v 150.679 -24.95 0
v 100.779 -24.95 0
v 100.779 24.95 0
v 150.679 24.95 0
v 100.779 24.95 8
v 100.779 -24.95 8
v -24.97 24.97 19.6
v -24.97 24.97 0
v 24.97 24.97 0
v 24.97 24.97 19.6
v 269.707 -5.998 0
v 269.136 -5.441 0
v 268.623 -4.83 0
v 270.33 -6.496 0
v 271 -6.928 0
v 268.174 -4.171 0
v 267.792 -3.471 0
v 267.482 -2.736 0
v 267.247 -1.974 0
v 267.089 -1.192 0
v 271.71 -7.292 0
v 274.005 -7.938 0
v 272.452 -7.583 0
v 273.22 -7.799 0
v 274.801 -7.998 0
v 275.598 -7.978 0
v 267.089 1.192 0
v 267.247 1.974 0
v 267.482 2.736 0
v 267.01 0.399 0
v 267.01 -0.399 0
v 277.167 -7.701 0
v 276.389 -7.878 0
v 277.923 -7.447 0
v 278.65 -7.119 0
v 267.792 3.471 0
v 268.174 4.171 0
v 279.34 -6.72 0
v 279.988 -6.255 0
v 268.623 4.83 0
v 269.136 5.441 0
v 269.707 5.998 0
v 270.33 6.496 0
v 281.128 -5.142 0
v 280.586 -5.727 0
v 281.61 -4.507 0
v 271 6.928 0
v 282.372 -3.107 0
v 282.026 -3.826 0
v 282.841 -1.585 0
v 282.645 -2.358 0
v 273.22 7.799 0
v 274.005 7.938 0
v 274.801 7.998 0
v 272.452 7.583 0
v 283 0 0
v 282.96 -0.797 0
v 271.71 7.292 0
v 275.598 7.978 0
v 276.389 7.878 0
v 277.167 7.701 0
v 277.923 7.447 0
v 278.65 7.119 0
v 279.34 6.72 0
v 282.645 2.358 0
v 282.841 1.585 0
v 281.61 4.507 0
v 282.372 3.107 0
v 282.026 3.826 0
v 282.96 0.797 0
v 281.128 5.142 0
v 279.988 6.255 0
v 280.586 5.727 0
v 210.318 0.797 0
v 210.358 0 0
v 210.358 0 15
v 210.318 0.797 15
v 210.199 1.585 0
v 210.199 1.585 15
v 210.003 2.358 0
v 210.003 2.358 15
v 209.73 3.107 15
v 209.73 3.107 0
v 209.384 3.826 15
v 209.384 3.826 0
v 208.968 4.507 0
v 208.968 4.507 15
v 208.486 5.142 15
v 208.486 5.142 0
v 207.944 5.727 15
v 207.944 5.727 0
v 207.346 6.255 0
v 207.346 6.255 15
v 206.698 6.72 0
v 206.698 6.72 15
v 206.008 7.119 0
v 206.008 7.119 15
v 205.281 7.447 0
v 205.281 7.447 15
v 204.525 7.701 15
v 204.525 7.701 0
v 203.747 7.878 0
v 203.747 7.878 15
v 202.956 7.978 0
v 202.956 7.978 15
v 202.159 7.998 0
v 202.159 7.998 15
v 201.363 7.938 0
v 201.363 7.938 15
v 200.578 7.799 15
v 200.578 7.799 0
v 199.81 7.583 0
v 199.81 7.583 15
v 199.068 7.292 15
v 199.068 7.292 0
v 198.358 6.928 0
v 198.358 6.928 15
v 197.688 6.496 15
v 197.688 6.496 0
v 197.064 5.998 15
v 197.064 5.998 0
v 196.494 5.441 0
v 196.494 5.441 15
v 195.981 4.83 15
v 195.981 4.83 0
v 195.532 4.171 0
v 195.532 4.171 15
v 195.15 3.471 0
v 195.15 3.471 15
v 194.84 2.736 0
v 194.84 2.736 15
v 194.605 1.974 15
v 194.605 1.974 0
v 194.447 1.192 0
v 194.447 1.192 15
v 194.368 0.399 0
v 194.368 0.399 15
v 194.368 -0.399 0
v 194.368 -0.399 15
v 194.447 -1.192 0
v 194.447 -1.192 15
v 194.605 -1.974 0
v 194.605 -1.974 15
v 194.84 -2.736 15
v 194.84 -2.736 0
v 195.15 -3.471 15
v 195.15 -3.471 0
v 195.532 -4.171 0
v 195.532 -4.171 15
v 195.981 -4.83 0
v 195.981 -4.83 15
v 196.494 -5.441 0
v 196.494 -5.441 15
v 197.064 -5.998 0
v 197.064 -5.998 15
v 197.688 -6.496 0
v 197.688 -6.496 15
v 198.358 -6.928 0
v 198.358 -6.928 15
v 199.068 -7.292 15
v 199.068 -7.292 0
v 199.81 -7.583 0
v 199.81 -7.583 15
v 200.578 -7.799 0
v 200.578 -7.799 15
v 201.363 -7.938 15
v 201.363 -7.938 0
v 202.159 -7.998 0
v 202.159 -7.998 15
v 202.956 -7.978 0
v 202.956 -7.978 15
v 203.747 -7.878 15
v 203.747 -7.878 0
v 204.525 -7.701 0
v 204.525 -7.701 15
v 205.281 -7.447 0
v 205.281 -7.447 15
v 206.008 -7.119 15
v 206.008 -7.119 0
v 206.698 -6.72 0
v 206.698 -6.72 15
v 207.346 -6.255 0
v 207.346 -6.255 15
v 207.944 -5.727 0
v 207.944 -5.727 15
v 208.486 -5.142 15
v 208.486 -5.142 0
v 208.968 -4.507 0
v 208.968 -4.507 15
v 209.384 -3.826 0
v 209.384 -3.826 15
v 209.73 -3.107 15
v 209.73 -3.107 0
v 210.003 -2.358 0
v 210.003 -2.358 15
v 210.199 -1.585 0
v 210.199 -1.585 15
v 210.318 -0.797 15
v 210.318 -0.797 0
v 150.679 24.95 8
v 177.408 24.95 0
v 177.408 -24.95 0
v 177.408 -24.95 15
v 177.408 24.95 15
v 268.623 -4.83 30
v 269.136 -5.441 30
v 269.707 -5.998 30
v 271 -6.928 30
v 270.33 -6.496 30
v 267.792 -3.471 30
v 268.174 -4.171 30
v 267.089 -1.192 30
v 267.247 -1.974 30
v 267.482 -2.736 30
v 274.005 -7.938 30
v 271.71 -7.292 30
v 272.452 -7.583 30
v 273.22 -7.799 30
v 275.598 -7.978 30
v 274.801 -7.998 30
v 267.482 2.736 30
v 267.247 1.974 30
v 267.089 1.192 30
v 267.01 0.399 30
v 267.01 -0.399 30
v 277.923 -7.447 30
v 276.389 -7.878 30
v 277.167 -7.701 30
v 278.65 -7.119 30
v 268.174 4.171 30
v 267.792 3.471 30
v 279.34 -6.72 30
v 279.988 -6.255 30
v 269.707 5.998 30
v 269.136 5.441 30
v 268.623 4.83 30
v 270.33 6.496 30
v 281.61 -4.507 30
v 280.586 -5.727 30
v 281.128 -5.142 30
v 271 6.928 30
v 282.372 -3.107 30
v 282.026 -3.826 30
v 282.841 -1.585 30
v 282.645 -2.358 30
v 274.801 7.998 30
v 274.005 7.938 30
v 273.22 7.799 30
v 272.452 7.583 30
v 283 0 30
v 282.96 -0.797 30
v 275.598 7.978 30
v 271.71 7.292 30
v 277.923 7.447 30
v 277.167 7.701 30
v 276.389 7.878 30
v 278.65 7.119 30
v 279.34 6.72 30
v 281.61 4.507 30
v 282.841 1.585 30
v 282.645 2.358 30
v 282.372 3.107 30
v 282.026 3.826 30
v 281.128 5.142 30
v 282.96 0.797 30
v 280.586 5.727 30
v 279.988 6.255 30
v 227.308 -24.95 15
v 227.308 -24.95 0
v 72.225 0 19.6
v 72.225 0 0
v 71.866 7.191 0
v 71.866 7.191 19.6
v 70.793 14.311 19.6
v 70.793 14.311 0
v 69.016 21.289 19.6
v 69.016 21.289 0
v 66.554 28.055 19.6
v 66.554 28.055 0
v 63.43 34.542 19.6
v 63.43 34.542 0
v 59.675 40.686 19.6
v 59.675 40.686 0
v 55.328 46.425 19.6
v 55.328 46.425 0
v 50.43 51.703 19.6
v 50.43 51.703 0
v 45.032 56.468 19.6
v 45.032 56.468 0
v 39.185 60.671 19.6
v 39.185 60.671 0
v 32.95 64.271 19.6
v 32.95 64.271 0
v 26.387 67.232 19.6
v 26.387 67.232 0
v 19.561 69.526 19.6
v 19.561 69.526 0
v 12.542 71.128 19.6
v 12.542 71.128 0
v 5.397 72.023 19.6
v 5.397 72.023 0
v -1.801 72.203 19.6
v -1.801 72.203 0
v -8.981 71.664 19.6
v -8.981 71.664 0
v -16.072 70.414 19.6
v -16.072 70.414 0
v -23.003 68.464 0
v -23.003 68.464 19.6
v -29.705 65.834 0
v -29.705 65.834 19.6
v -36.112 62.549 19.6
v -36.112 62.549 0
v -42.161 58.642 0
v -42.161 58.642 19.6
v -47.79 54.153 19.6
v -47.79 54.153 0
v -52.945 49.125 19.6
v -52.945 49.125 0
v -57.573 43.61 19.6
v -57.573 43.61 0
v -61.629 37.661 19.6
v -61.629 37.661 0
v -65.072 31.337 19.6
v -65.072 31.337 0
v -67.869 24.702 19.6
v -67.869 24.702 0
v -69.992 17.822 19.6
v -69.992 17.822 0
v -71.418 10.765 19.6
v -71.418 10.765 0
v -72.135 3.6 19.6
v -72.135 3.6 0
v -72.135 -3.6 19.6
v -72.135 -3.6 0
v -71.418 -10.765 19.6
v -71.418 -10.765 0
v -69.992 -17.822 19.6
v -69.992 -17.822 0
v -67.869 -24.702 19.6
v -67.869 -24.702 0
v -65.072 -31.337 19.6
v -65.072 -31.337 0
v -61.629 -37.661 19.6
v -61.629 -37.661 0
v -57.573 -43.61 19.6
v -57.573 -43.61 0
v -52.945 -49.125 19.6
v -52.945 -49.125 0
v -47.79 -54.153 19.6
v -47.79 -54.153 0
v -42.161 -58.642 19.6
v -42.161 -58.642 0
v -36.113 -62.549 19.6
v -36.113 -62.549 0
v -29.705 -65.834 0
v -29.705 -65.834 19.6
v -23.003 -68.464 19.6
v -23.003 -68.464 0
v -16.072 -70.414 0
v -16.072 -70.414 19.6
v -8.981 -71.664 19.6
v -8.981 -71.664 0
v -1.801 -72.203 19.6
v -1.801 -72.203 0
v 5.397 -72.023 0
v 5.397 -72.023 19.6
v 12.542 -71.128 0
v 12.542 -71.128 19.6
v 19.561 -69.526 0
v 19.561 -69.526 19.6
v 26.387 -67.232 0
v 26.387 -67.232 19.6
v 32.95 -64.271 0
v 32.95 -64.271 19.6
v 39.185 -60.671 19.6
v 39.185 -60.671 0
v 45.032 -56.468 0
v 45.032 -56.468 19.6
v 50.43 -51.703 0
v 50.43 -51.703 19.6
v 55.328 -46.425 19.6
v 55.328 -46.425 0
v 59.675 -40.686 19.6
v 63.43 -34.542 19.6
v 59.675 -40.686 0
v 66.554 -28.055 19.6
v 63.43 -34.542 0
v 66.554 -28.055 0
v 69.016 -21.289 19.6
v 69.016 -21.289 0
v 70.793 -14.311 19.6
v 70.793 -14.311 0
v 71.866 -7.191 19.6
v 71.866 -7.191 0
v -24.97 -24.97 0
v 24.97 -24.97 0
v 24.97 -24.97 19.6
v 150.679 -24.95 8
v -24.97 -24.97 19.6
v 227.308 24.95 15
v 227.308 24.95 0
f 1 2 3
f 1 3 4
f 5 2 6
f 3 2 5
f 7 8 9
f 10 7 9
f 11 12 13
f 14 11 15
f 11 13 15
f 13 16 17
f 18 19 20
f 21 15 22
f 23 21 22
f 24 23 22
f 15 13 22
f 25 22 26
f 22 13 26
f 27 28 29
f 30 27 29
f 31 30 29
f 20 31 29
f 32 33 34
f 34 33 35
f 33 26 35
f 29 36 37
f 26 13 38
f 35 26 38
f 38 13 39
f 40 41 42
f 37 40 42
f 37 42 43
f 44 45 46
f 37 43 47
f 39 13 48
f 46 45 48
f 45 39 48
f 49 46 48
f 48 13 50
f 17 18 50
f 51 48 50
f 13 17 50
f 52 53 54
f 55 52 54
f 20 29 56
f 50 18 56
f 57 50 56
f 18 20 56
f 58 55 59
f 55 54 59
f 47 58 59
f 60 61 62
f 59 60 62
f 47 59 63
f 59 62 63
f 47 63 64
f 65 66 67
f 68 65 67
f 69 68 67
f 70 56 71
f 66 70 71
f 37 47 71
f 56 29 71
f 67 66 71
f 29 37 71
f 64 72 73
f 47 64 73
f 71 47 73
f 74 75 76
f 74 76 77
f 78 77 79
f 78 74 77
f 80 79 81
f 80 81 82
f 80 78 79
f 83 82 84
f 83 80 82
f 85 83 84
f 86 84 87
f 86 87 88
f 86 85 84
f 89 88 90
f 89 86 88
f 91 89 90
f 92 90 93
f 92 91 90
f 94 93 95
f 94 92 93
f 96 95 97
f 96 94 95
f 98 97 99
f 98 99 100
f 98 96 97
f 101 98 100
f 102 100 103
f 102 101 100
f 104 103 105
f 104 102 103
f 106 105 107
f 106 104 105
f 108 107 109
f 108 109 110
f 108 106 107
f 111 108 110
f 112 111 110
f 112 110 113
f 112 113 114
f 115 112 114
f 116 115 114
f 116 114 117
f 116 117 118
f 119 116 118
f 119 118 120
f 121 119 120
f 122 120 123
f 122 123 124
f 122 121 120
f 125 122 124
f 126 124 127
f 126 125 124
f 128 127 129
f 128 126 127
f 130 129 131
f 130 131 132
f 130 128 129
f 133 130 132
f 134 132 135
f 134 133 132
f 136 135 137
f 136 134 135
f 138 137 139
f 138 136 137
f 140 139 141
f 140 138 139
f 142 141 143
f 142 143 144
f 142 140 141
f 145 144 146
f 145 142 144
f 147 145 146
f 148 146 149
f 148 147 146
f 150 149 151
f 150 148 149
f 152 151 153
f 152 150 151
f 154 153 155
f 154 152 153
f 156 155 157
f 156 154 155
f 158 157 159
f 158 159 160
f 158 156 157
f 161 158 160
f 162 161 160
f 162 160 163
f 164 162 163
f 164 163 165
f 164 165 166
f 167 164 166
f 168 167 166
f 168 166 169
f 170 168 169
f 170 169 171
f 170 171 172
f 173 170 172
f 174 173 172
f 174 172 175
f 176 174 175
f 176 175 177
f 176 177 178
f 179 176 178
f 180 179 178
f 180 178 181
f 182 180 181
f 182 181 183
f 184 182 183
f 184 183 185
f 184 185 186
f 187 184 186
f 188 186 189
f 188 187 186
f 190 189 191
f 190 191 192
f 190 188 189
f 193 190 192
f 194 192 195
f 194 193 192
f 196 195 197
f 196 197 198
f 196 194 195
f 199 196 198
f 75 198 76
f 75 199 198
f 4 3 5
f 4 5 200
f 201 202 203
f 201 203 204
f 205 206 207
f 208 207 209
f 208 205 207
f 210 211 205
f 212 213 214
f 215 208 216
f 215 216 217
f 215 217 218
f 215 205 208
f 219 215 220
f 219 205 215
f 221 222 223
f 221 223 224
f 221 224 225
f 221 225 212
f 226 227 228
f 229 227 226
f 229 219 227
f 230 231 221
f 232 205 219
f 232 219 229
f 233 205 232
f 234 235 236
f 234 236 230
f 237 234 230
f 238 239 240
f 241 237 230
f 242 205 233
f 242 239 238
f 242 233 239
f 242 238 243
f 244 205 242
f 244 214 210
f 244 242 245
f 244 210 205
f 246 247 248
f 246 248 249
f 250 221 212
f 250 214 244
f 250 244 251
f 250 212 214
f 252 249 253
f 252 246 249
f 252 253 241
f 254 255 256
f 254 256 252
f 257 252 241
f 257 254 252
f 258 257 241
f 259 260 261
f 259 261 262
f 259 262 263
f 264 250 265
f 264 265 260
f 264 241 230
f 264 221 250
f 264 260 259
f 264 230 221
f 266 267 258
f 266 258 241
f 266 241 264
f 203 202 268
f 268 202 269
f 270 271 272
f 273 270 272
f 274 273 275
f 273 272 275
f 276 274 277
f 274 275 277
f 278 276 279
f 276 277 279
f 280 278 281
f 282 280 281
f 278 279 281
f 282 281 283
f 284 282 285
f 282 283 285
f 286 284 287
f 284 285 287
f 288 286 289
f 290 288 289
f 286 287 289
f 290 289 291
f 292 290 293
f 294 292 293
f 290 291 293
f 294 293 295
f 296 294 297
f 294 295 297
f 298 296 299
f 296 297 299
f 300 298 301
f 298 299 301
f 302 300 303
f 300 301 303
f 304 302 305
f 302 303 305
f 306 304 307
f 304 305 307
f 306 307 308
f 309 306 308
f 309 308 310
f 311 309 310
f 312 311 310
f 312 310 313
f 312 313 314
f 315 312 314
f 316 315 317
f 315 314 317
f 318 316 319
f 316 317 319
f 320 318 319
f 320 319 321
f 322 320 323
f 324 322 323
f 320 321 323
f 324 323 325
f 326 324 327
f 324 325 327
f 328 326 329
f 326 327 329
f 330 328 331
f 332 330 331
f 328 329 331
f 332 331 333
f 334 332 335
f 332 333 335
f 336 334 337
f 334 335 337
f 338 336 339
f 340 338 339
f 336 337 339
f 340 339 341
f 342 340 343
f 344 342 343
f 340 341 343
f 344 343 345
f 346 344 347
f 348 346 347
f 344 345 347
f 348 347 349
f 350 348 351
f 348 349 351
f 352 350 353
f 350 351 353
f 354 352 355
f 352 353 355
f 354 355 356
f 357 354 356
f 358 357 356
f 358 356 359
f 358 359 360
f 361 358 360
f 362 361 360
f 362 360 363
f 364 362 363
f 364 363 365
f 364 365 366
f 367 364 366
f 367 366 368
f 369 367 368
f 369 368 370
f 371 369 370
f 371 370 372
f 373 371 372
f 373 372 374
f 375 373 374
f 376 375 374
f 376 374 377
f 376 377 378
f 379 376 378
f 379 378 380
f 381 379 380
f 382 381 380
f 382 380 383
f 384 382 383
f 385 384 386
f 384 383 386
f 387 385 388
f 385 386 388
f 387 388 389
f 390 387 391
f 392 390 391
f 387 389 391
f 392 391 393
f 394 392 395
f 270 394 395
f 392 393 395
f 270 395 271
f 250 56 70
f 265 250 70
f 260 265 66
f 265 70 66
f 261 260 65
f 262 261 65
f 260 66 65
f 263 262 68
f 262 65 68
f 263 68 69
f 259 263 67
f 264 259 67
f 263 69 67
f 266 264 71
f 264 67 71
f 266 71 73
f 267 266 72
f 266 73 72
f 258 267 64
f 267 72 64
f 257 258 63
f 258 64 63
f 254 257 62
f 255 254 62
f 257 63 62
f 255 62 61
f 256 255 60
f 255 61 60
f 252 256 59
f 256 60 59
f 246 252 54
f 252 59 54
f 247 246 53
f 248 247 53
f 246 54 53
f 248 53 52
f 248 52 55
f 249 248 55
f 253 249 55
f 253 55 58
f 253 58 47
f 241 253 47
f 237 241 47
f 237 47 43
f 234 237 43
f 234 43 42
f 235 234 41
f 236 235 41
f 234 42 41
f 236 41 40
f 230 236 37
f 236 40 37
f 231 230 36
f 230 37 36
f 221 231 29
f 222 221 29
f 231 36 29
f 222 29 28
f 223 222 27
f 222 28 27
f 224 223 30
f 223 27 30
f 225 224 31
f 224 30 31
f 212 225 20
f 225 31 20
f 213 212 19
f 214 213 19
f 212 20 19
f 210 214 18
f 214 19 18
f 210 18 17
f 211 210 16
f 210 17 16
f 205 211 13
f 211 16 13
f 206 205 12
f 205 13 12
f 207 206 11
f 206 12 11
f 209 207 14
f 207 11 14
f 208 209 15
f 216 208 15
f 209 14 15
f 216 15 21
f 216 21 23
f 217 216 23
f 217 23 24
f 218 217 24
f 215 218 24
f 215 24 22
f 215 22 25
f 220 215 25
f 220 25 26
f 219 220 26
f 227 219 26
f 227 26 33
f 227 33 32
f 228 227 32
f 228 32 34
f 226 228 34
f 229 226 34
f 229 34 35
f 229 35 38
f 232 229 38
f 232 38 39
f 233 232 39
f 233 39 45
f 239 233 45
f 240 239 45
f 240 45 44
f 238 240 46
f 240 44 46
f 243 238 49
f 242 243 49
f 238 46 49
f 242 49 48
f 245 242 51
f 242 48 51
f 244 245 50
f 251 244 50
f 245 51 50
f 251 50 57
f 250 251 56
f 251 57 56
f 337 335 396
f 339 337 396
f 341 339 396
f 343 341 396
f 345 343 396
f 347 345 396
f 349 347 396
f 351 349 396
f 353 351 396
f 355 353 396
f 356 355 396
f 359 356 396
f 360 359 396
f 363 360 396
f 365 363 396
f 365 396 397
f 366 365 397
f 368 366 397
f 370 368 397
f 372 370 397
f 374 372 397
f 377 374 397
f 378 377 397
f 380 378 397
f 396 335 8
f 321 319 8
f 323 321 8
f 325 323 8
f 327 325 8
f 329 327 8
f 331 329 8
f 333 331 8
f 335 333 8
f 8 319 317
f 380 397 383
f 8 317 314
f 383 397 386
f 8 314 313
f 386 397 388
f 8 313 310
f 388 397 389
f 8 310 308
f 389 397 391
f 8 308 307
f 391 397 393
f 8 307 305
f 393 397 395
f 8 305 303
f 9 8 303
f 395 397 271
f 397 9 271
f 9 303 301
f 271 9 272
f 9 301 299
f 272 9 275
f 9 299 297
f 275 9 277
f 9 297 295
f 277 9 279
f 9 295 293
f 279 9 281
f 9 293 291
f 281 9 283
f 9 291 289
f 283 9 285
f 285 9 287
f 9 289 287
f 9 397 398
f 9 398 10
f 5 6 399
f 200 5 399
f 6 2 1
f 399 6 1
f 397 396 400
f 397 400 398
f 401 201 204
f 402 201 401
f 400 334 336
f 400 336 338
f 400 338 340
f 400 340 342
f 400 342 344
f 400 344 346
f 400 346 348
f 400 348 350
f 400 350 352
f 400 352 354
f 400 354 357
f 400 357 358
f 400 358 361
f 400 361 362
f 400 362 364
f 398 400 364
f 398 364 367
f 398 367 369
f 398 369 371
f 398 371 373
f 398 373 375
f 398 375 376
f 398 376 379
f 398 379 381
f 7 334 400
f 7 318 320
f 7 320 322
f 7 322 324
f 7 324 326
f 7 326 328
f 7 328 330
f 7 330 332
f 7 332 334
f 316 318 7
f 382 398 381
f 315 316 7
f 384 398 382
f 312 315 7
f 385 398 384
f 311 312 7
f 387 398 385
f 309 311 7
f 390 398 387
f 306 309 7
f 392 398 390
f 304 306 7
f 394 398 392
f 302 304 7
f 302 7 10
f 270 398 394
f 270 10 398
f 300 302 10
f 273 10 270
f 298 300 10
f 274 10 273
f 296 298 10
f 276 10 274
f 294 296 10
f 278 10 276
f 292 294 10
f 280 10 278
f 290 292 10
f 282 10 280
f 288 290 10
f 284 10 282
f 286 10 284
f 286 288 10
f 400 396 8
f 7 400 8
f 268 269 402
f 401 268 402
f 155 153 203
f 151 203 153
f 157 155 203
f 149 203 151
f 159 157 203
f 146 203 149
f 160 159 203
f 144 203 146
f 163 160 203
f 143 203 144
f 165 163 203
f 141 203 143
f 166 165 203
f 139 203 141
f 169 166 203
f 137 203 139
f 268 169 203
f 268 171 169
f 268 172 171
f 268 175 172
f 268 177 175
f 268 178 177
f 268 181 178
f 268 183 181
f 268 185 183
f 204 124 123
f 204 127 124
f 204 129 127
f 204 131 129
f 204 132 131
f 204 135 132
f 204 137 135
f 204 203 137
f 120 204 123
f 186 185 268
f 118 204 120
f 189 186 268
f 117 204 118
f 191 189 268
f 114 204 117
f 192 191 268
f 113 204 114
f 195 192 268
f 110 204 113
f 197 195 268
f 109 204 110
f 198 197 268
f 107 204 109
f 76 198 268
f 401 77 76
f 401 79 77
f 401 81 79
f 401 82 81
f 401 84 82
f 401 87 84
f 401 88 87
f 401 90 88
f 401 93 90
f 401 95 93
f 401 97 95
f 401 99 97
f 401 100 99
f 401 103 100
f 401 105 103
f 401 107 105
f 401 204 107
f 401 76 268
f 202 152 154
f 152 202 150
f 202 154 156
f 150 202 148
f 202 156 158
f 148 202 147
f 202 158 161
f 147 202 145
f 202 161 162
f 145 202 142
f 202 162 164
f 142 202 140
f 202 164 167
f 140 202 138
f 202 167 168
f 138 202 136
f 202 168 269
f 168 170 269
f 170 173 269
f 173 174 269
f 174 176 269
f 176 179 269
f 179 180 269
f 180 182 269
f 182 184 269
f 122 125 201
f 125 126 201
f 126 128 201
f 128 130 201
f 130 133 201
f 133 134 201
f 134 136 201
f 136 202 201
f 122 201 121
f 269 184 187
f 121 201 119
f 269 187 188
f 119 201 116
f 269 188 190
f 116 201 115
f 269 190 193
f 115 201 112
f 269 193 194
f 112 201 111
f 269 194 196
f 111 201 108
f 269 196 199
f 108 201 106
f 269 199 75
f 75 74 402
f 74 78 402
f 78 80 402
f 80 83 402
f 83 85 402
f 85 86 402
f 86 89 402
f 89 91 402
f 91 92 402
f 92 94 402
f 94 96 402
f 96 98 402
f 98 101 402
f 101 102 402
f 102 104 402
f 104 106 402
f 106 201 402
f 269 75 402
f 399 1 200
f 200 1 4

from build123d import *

# Parameters (mm, degrees)
F0_R     = 72.225
F0_W     = 49.94
F0_H     = 49.94
F1_DEPTH = 19.6
F2_W     = 49.9
F2_H     = 49.9
F3_DEPTH = 8
F4_W     = 49.9
F4_H     = 49.9
F4_R     = 8
F5_DEPTH = 15
F6_R     = 8
F7_DEPTH = 30


with BuildPart() as f1:
    # F0 (on Top) → F1 (new body)
    with BuildSketch(Plane.XY):
        Circle(F0_R)
        Rectangle(F0_W, F0_H, mode=Mode.SUBTRACT)
    extrude(amount=F1_DEPTH)


with BuildPart() as f3:
    # F2 (on Top) → F3 (new body)
    with BuildSketch(Plane.XY):
        with Locations((125.729159, 0)):
            Rectangle(F2_W, F2_H)
    extrude(amount=F3_DEPTH)


with BuildPart() as f5:
    # F4 (on Top) → F5 (new body)
    with BuildSketch(Plane.XY):
        with Locations((202.357963, 0)):
            Rectangle(F4_W, F4_H)
        with Locations((202.357963, 0)):
            Circle(F4_R, mode=Mode.SUBTRACT)
    extrude(amount=F5_DEPTH)


with BuildPart() as f7:
    # F6 (on Top) → F7 (new body)
    with BuildSketch(Plane.XY):
        with Locations((275, 0)):
            Circle(F6_R)
    extrude(amount=F7_DEPTH)


solid = Compound([f1.part, f3.part, f5.part, f7.part])
